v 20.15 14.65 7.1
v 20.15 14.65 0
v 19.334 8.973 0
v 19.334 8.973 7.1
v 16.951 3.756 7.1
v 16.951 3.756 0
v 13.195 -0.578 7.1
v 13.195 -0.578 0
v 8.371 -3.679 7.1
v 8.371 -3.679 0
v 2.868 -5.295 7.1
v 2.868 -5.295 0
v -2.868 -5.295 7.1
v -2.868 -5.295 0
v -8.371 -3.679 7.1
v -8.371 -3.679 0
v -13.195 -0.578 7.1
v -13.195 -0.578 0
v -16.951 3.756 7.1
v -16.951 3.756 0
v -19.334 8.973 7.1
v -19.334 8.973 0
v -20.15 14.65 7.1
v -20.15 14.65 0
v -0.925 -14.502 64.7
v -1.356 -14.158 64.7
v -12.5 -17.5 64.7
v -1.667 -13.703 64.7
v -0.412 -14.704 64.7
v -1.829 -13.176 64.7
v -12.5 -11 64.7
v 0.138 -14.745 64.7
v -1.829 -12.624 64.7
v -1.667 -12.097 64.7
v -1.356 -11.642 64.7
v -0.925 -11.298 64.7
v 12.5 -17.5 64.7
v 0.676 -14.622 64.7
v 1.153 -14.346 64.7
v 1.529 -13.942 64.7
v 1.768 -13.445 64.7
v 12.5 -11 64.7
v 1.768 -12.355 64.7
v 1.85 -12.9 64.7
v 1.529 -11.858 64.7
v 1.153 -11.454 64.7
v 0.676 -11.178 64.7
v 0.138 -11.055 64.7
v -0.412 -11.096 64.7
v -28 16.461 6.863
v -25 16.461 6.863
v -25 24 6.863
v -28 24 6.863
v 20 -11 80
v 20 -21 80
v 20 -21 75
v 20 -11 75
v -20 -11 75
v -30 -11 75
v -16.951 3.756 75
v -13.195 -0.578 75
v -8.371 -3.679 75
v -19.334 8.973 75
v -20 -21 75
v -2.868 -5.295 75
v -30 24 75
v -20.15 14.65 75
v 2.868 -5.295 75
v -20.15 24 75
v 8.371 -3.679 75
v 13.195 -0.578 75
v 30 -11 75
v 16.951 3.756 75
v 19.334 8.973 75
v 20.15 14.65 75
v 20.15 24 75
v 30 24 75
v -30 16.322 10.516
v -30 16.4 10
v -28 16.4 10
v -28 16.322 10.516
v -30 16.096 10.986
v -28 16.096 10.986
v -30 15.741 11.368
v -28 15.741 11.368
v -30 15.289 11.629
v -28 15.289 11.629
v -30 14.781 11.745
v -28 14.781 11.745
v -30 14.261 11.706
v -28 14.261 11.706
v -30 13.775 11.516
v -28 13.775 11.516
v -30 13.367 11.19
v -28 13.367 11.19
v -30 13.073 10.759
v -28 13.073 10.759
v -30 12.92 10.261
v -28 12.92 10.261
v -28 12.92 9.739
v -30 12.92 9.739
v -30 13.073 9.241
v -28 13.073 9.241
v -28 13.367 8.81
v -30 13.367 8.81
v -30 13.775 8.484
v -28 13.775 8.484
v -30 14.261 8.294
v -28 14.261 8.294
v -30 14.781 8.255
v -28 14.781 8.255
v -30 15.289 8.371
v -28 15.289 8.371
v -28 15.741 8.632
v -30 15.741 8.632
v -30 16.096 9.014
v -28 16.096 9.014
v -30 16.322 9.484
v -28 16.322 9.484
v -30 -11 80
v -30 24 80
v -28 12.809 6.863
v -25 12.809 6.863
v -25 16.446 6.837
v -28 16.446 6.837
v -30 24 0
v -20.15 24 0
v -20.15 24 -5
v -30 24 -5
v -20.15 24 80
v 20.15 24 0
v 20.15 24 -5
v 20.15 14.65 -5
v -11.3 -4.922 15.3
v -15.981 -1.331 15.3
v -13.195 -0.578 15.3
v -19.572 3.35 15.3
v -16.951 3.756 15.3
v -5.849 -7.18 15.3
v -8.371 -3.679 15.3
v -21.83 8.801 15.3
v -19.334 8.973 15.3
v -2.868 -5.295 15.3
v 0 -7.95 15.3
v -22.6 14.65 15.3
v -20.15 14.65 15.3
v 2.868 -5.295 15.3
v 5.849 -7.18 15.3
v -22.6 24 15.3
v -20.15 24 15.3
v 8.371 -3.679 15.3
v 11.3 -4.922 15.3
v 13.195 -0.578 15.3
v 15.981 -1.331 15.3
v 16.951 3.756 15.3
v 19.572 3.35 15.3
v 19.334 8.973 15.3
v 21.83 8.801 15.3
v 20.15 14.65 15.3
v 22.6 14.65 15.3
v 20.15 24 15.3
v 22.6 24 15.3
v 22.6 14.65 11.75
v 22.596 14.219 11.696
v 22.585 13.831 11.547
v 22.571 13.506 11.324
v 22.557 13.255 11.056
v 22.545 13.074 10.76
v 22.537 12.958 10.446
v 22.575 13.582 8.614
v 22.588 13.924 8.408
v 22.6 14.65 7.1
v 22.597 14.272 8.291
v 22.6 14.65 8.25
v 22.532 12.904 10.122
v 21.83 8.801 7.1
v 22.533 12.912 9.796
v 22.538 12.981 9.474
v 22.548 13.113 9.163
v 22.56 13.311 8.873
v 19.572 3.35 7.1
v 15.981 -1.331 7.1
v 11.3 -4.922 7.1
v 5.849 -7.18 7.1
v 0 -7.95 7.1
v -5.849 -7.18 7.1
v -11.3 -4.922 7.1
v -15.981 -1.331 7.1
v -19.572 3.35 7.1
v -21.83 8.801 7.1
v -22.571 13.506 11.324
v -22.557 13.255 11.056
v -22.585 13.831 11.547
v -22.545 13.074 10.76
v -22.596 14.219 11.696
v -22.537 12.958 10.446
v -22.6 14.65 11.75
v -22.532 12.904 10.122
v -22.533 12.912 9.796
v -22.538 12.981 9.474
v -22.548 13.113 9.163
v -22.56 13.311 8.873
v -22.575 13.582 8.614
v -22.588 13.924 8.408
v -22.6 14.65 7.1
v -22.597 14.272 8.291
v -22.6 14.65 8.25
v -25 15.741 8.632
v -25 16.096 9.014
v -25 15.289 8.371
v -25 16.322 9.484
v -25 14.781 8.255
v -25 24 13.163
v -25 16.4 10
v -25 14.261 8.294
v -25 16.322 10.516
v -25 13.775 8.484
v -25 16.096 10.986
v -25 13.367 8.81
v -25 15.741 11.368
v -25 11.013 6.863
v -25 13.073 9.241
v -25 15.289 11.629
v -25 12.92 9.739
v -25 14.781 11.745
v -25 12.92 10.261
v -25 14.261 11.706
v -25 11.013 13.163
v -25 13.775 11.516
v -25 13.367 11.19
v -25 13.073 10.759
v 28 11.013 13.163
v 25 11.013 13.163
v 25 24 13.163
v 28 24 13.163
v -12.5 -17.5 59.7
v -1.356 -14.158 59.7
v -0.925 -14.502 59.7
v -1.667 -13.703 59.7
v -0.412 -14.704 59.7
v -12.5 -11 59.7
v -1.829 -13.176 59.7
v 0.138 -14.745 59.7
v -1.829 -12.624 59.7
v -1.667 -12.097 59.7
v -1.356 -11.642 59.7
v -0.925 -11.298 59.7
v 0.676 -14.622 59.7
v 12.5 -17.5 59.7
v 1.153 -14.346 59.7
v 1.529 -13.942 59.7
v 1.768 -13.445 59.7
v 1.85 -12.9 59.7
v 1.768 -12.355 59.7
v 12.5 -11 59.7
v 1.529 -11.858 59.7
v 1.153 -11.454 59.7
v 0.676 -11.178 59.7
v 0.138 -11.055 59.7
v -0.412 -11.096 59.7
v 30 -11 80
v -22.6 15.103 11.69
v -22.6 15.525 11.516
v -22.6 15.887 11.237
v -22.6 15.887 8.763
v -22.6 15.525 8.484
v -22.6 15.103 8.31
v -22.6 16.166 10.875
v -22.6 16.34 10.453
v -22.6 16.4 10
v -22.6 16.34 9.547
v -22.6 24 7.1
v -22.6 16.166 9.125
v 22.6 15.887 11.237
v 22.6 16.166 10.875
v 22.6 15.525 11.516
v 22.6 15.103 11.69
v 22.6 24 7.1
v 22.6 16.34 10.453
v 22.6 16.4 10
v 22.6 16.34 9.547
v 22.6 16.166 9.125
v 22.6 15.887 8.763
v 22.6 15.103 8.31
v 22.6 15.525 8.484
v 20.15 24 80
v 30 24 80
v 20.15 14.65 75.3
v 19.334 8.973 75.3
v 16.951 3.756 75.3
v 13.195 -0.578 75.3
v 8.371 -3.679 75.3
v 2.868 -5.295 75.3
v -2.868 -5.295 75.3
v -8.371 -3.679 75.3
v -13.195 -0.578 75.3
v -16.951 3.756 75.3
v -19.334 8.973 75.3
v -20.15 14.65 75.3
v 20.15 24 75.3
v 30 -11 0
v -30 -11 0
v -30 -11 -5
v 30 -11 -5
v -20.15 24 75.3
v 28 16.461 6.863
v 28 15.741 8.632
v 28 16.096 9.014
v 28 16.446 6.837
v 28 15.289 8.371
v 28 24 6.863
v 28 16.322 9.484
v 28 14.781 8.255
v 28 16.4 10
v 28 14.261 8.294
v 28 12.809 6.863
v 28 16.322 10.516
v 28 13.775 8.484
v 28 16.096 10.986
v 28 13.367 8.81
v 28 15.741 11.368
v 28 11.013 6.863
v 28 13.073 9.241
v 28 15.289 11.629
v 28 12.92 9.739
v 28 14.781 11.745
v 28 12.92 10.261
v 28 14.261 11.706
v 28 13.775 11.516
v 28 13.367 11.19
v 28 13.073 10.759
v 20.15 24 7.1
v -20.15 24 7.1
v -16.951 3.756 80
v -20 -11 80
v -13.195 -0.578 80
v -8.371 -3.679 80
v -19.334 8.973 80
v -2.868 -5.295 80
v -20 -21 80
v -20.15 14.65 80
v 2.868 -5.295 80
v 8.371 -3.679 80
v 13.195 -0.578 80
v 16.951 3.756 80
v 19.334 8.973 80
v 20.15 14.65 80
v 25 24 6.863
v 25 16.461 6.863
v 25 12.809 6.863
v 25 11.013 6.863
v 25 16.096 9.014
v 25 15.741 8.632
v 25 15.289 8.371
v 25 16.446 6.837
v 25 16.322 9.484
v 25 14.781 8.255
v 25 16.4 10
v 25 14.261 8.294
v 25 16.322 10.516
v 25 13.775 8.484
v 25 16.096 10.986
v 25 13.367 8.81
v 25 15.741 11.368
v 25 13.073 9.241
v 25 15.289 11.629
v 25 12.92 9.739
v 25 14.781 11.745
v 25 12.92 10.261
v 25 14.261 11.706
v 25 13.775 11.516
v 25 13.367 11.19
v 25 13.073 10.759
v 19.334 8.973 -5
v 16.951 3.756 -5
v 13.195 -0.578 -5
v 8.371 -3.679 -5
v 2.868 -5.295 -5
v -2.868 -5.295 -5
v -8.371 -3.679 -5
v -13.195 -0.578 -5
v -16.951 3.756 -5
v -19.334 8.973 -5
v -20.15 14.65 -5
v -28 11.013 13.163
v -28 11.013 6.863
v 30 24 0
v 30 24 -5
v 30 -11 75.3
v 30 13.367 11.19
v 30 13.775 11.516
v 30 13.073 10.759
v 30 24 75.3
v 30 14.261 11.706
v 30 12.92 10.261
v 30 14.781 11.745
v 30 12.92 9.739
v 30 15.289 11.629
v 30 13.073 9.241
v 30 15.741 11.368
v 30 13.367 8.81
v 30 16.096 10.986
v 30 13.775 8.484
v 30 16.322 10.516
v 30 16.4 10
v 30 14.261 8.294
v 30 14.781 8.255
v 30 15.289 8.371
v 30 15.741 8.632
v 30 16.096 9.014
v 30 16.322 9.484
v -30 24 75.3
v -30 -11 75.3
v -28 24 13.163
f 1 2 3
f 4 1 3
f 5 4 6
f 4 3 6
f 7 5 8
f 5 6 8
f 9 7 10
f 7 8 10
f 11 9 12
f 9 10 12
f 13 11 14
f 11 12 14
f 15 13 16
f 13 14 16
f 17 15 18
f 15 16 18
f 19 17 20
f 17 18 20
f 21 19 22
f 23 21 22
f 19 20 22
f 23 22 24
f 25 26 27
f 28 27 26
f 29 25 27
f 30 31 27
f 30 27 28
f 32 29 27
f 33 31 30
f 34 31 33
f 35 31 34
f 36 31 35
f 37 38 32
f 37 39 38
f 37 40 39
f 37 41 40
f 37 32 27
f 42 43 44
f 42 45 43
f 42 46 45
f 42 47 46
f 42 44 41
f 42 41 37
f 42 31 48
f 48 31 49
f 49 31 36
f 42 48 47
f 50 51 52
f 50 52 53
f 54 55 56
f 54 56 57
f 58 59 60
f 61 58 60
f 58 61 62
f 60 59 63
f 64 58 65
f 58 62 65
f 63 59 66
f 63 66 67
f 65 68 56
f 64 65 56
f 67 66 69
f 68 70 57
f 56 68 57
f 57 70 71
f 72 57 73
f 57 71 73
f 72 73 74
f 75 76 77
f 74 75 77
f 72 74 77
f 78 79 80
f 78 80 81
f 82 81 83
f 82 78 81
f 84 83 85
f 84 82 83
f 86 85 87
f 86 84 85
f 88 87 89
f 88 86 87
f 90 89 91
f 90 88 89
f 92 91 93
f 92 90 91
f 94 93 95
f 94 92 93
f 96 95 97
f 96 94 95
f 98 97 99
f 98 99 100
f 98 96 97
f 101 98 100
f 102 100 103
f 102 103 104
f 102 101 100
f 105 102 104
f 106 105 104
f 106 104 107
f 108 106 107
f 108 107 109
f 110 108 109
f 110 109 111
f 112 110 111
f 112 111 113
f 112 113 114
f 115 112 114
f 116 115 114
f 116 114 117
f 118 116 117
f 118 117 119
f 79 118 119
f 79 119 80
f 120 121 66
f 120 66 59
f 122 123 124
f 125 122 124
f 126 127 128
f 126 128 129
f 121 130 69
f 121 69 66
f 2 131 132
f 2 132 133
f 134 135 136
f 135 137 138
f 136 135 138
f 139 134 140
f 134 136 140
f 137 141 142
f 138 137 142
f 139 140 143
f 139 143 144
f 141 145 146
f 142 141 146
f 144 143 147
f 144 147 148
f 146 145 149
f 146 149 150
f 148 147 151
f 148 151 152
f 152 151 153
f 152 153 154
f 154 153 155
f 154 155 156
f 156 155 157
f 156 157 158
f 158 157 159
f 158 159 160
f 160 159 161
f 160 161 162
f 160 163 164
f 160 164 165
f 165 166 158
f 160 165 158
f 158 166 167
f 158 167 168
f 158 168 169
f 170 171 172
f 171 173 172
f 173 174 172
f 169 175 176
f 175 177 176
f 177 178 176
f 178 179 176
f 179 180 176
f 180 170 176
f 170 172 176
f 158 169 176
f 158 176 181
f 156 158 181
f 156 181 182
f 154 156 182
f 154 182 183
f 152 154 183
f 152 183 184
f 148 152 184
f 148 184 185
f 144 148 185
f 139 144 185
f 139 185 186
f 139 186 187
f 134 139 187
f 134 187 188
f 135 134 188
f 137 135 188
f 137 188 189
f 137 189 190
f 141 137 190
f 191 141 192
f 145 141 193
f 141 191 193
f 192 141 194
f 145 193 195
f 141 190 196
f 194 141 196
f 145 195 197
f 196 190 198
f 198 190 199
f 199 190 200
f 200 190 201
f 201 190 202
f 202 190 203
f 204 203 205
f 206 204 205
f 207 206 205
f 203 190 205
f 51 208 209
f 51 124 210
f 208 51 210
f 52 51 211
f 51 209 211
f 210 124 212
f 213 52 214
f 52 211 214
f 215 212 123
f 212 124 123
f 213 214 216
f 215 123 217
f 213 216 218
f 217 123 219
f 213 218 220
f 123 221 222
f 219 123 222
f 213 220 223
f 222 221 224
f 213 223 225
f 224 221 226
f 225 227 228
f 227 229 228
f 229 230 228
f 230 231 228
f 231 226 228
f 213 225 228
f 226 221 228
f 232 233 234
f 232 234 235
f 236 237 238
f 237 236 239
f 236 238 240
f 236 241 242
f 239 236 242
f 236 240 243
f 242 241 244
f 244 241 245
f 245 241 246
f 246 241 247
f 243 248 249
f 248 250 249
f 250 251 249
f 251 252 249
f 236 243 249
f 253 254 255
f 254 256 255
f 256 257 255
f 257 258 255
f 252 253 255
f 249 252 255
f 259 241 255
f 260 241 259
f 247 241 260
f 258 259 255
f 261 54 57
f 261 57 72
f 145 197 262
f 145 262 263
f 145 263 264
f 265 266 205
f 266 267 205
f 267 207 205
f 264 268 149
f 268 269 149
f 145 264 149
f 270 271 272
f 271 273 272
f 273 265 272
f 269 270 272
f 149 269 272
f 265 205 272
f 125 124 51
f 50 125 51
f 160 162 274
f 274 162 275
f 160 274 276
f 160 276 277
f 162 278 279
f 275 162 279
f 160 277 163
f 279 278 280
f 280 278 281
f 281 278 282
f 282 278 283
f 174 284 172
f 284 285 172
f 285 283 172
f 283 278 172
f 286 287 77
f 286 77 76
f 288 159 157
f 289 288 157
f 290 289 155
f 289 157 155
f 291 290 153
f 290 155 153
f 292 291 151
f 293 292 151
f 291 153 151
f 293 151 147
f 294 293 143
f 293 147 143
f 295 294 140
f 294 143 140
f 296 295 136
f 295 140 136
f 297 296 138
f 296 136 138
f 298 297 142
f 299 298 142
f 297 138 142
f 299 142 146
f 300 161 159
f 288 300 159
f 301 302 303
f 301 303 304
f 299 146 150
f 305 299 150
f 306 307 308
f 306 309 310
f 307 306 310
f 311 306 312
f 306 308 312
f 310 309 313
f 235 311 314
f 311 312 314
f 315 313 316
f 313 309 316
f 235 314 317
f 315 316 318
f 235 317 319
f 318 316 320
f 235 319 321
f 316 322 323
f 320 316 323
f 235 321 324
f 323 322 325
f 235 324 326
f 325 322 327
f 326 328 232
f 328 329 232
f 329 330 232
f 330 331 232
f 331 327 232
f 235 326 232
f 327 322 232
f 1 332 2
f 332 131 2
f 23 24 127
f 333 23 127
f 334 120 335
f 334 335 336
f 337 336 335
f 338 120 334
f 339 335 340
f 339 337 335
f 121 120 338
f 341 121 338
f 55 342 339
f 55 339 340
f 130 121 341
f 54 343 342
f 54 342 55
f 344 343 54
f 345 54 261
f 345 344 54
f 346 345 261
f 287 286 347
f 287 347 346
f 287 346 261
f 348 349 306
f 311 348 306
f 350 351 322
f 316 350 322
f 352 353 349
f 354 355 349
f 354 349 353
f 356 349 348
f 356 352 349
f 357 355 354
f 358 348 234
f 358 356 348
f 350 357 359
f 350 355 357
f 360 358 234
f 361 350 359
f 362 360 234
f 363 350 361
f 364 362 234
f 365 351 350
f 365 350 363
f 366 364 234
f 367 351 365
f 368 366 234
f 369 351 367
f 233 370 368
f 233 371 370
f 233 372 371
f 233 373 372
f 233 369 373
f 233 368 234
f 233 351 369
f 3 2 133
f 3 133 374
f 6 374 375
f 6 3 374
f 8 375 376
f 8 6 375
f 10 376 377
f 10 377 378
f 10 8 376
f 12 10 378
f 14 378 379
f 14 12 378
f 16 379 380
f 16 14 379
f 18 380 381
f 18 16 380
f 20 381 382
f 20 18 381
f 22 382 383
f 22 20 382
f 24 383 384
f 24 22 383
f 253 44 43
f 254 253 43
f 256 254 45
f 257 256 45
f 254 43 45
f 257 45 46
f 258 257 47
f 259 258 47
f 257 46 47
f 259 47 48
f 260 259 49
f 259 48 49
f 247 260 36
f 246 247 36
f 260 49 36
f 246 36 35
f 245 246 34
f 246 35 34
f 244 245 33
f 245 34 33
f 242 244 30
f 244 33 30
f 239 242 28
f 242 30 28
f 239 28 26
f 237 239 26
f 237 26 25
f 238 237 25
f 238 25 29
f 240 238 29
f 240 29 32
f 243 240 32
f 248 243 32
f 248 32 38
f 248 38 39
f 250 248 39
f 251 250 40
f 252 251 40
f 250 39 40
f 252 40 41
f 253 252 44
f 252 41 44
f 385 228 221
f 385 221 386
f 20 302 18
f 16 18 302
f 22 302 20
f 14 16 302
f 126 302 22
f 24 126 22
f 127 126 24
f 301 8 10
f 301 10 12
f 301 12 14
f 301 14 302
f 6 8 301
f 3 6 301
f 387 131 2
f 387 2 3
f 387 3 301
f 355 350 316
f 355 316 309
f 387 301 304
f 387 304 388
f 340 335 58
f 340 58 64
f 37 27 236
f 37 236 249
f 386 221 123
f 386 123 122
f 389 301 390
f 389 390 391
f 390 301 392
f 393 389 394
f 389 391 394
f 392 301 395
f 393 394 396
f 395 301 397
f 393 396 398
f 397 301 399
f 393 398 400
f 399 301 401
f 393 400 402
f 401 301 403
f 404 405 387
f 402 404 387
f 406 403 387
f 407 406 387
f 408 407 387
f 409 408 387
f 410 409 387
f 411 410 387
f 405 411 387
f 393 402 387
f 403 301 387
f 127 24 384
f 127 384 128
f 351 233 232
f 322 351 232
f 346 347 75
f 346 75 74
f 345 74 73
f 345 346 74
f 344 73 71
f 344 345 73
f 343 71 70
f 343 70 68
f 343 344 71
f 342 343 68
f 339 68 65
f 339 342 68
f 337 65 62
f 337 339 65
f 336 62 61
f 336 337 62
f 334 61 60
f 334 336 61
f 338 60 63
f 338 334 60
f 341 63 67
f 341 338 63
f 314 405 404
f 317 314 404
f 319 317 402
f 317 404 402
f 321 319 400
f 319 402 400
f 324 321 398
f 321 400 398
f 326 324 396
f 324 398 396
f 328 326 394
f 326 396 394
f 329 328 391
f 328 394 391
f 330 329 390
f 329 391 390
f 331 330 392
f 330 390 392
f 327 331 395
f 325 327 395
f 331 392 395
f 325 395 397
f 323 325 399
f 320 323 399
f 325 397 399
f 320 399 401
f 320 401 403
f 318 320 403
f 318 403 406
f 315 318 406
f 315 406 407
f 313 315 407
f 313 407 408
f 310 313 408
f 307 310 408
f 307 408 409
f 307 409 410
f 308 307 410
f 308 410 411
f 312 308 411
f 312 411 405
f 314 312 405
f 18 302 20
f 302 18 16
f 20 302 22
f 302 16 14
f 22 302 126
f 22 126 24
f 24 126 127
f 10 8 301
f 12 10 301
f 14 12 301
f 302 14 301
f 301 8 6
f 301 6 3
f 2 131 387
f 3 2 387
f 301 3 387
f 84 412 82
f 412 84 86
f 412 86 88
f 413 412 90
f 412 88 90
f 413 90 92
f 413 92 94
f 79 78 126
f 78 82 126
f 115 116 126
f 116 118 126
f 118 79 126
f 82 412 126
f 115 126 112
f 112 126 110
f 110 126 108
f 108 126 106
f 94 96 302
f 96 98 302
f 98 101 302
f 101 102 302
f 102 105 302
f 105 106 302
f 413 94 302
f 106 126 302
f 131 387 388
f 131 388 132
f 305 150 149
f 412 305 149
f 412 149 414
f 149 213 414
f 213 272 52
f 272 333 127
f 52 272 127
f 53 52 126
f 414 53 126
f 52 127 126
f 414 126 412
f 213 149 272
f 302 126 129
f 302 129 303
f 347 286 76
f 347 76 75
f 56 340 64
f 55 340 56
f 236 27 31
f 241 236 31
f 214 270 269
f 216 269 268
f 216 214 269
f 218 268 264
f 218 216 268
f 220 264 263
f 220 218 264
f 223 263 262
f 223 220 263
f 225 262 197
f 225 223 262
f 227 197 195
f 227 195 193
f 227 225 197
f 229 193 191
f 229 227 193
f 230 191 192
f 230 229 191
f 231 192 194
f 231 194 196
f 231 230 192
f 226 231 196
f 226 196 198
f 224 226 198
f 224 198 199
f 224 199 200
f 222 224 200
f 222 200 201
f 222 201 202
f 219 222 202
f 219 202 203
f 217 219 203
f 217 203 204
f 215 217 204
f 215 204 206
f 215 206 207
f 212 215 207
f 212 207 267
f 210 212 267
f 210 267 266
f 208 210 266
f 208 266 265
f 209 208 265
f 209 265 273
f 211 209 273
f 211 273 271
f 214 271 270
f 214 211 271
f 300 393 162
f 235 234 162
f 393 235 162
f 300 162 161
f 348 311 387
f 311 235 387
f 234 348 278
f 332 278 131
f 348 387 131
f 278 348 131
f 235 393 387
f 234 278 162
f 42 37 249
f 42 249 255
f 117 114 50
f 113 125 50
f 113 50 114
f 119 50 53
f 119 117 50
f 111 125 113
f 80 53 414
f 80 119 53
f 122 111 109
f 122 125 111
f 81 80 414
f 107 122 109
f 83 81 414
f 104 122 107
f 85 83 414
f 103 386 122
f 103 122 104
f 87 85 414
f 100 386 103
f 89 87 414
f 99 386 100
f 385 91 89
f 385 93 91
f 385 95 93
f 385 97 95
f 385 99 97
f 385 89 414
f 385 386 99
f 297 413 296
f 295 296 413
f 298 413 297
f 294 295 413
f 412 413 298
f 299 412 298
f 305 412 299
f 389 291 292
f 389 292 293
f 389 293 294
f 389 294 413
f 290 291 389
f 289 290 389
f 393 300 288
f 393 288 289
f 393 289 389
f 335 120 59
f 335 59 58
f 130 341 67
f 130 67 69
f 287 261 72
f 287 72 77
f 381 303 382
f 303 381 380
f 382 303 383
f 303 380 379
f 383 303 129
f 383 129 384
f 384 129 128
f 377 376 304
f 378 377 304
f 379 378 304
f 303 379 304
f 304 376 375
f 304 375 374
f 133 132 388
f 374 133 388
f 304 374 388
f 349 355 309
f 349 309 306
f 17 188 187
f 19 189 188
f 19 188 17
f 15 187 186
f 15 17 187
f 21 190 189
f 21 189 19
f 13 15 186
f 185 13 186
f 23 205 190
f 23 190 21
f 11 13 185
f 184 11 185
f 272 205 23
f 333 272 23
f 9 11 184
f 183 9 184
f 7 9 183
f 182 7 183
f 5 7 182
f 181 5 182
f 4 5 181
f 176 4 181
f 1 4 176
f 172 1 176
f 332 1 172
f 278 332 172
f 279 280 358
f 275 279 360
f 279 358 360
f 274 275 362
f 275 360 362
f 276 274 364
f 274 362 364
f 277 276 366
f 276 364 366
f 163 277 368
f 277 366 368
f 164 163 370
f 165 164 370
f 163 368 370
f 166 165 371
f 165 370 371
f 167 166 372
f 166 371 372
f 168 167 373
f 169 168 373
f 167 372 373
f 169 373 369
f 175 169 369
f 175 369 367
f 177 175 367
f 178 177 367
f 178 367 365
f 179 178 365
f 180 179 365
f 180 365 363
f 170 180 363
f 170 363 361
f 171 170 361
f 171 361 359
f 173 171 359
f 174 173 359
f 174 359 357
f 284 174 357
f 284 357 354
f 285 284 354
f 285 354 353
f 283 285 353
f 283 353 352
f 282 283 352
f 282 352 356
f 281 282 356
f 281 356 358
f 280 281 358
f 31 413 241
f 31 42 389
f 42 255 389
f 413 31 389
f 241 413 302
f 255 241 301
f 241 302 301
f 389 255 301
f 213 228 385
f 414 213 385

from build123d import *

# Parameters (mm, degrees)
F1_DEPTH  = 5
F3_DEPTH  = 2.1
F5_DEPTH  = 8.2
F7_DEPTH  = 60
F10_DEPTH = 5
F12_W     = 25
F12_H     = 6.5
F12_R     = 1.85
F13_DEPTH = 5
F15_R     = 1.75
F16_DEPTH = 3
F17_R     = 1.75
F18_DEPTH = 10
F20_W     = 3
F20_H     = 6.2998386914
F21_DEPTH = 25


# Not quite as in the source:
# - a pattern or mirror of a feature is missing from the dataset's text; its kind, count and spacing are read off the source's solid
# - a feature names something its author has since deleted; it is built from what else it names


with BuildPart() as f1:
    # F0 (on Top) → F1 (new body)
    with BuildSketch(Plane.XY):
        with BuildLine():
            Line((-20.15, 24), (-30, 24))
            Line((-30, 24), (-30, -11))
            Line((-30, -11), (-12.5, -11))
            Line((-12.5, -11), (30, -11))
            Line((30, -11), (30, 24))
            Line((30, 24), (20.15, 24))
            Line((20.15, 24), (20.15, 14.65))
            ThreePointArc((20.15, 14.65), (0, -5.5), (-20.15, 14.65))
            Line((-20.15, 14.65), (-20.15, 24))
        make_face()
    extrude(amount=F1_DEPTH)

    # F2 (on face) → F3 (join)
    with BuildSketch(Plane.XY.offset(5)):
        with BuildLine():
            Line((-20.15, 24), (-30, 24))
            Line((-30, 24), (-30, -11))
            Line((-30, -11), (30, -11))
            Line((30, -11), (30, 24))
            Line((30, 24), (20.15, 24))
            Line((20.15, 24), (20.15, 14.65))
            ThreePointArc((20.15, 14.65), (0, -5.5), (-20.15, 14.65))
            Line((-20.15, 14.65), (-20.15, 24))
        make_face()
    extrude(amount=F3_DEPTH)

    # F4 (on face) → F5 (join)
    with BuildSketch(Plane.XY.offset(7.1)):
        with BuildLine():
            Line((-22.6, 24), (-30, 24))
            Line((-30, 24), (-30, -11))
            Line((-30, -11), (30, -11))
            Line((30, -11), (30, 24))
            Line((30, 24), (22.6, 24))
            Line((22.6, 24), (22.6, 14.65))
            ThreePointArc((22.6, 14.65), (0, -7.95), (-22.6, 14.65))
            Line((-22.6, 14.65), (-22.6, 24))
        make_face()
    extrude(amount=F5_DEPTH)

    # F6 (on face) → F7 (join)
    with BuildSketch(Plane.XY.offset(15.3)):
        with BuildLine():
            Line((-20.15, 24), (-30, 24))
            Line((-30, 24), (-30, -11))
            Line((-30, -11), (30, -11))
            Line((30, -11), (30, 24))
            Line((30, 24), (20.15, 24))
            Line((20.15, 24), (20.15, 14.65))
            ThreePointArc((20.15, 14.65), (0, -5.5), (-20.15, 14.65))
            Line((-20.15, 14.65), (-20.15, 24))
        make_face()
    extrude(amount=F7_DEPTH)

    # F12 (on offset) → F13 (join)
    with BuildSketch(Plane.XY.offset(64.7)):
        with Locations((0, -14.25)):
            Rectangle(F12_W, F12_H)
        with Locations((0, -12.9)):
            Circle(F12_R, mode=Mode.SUBTRACT)
    extrude(amount=-F13_DEPTH)

    # F15 (on offset) → F16 (cut)
    with BuildSketch(Plane.YZ.offset(25)):
        Polygon((11.0127864357, 10.0260285901), (12.8088517975, 6.8630949494), (16.4460653619, 6.8370663592), (18.2872135643, 9.9739714099), (16.4911482025, 13.1369050506), (12.8539346381, 13.1629336408), align=None)
        with Locations((14.65, 10)):
            Circle(F15_R, mode=Mode.SUBTRACT)
    f16 = extrude(amount=F16_DEPTH, mode=Mode.SUBTRACT)

    # F16_copies: F16 across plane
    add(f16.mirror(Plane(origin=(0, 0, 0), x_dir=(0, 0, -1), z_dir=(-1, 0, 0))), mode=Mode.SUBTRACT)

    # F17 (on face) → F18 (cut)
    with BuildSketch(Plane.YZ.offset(30)):
        with Locations((14.65, 10)):
            Circle(F17_R)
    f18 = extrude(amount=-F18_DEPTH, mode=Mode.SUBTRACT)

    # F18_copies: F18 across plane
    add(f18.mirror(Plane(origin=(0, 0, 0), x_dir=(0, 0, -1), z_dir=(-1, 0, 0))), mode=Mode.SUBTRACT)

    # F20 (on plane+point) → F21 (cut)
    with BuildSketch(Plane.XZ.offset(-11.0127864357)):
        with Locations((26.5, 10.0130142951)):
            Rectangle(F20_W, F20_H)
    f21 = extrude(amount=-F21_DEPTH, mode=Mode.SUBTRACT)

    # F21_copies: F21 across plane
    add(f21.mirror(Plane(origin=(0, 0, 0), x_dir=(0, 0, -1), z_dir=(-1, 0, 0))), mode=Mode.SUBTRACT)


with BuildPart() as f10:
    # F9 (on offset) → F10 (new body)
    with BuildSketch(Plane.XY.offset(80)):
        with BuildLine():
            Line((-20.15, 24), (-30, 24))
            Line((-30, 24), (-30, -11))
            Line((-30, -11), (-20, -11))
            Line((-20, -11), (-20, -21))
            Line((-20, -21), (20, -21))
            Line((20, -21), (20, -11))
            Line((20, -11), (30, -11))
            Line((30, -11), (30, 24))
            Line((30, 24), (20.15, 24))
            Line((20.15, 24), (20.15, 14.65))
            ThreePointArc((20.15, 14.65), (0, -5.5), (-20.15, 14.65))
            Line((-20.15, 14.65), (-20.15, 24))
        make_face()
    extrude(amount=-F10_DEPTH)


with BuildPart() as f10b:
    # F0 (on Top) → F10, piece 2 (new body)
    with BuildSketch(Plane.XY):
        with BuildLine():
            Line((-20.15, 24), (-30, 24))
            Line((-30, 24), (-30, -11))
            Line((-30, -11), (-12.5, -11))
            Line((-12.5, -11), (30, -11))
            Line((30, -11), (30, 24))
            Line((30, 24), (20.15, 24))
            Line((20.15, 24), (20.15, 14.65))
            ThreePointArc((20.15, 14.65), (0, -5.5), (-20.15, 14.65))
            Line((-20.15, 14.65), (-20.15, 24))
        make_face()
    extrude(amount=-F10_DEPTH)


solid = Compound([f1.part, f10.part, f10b.part])
